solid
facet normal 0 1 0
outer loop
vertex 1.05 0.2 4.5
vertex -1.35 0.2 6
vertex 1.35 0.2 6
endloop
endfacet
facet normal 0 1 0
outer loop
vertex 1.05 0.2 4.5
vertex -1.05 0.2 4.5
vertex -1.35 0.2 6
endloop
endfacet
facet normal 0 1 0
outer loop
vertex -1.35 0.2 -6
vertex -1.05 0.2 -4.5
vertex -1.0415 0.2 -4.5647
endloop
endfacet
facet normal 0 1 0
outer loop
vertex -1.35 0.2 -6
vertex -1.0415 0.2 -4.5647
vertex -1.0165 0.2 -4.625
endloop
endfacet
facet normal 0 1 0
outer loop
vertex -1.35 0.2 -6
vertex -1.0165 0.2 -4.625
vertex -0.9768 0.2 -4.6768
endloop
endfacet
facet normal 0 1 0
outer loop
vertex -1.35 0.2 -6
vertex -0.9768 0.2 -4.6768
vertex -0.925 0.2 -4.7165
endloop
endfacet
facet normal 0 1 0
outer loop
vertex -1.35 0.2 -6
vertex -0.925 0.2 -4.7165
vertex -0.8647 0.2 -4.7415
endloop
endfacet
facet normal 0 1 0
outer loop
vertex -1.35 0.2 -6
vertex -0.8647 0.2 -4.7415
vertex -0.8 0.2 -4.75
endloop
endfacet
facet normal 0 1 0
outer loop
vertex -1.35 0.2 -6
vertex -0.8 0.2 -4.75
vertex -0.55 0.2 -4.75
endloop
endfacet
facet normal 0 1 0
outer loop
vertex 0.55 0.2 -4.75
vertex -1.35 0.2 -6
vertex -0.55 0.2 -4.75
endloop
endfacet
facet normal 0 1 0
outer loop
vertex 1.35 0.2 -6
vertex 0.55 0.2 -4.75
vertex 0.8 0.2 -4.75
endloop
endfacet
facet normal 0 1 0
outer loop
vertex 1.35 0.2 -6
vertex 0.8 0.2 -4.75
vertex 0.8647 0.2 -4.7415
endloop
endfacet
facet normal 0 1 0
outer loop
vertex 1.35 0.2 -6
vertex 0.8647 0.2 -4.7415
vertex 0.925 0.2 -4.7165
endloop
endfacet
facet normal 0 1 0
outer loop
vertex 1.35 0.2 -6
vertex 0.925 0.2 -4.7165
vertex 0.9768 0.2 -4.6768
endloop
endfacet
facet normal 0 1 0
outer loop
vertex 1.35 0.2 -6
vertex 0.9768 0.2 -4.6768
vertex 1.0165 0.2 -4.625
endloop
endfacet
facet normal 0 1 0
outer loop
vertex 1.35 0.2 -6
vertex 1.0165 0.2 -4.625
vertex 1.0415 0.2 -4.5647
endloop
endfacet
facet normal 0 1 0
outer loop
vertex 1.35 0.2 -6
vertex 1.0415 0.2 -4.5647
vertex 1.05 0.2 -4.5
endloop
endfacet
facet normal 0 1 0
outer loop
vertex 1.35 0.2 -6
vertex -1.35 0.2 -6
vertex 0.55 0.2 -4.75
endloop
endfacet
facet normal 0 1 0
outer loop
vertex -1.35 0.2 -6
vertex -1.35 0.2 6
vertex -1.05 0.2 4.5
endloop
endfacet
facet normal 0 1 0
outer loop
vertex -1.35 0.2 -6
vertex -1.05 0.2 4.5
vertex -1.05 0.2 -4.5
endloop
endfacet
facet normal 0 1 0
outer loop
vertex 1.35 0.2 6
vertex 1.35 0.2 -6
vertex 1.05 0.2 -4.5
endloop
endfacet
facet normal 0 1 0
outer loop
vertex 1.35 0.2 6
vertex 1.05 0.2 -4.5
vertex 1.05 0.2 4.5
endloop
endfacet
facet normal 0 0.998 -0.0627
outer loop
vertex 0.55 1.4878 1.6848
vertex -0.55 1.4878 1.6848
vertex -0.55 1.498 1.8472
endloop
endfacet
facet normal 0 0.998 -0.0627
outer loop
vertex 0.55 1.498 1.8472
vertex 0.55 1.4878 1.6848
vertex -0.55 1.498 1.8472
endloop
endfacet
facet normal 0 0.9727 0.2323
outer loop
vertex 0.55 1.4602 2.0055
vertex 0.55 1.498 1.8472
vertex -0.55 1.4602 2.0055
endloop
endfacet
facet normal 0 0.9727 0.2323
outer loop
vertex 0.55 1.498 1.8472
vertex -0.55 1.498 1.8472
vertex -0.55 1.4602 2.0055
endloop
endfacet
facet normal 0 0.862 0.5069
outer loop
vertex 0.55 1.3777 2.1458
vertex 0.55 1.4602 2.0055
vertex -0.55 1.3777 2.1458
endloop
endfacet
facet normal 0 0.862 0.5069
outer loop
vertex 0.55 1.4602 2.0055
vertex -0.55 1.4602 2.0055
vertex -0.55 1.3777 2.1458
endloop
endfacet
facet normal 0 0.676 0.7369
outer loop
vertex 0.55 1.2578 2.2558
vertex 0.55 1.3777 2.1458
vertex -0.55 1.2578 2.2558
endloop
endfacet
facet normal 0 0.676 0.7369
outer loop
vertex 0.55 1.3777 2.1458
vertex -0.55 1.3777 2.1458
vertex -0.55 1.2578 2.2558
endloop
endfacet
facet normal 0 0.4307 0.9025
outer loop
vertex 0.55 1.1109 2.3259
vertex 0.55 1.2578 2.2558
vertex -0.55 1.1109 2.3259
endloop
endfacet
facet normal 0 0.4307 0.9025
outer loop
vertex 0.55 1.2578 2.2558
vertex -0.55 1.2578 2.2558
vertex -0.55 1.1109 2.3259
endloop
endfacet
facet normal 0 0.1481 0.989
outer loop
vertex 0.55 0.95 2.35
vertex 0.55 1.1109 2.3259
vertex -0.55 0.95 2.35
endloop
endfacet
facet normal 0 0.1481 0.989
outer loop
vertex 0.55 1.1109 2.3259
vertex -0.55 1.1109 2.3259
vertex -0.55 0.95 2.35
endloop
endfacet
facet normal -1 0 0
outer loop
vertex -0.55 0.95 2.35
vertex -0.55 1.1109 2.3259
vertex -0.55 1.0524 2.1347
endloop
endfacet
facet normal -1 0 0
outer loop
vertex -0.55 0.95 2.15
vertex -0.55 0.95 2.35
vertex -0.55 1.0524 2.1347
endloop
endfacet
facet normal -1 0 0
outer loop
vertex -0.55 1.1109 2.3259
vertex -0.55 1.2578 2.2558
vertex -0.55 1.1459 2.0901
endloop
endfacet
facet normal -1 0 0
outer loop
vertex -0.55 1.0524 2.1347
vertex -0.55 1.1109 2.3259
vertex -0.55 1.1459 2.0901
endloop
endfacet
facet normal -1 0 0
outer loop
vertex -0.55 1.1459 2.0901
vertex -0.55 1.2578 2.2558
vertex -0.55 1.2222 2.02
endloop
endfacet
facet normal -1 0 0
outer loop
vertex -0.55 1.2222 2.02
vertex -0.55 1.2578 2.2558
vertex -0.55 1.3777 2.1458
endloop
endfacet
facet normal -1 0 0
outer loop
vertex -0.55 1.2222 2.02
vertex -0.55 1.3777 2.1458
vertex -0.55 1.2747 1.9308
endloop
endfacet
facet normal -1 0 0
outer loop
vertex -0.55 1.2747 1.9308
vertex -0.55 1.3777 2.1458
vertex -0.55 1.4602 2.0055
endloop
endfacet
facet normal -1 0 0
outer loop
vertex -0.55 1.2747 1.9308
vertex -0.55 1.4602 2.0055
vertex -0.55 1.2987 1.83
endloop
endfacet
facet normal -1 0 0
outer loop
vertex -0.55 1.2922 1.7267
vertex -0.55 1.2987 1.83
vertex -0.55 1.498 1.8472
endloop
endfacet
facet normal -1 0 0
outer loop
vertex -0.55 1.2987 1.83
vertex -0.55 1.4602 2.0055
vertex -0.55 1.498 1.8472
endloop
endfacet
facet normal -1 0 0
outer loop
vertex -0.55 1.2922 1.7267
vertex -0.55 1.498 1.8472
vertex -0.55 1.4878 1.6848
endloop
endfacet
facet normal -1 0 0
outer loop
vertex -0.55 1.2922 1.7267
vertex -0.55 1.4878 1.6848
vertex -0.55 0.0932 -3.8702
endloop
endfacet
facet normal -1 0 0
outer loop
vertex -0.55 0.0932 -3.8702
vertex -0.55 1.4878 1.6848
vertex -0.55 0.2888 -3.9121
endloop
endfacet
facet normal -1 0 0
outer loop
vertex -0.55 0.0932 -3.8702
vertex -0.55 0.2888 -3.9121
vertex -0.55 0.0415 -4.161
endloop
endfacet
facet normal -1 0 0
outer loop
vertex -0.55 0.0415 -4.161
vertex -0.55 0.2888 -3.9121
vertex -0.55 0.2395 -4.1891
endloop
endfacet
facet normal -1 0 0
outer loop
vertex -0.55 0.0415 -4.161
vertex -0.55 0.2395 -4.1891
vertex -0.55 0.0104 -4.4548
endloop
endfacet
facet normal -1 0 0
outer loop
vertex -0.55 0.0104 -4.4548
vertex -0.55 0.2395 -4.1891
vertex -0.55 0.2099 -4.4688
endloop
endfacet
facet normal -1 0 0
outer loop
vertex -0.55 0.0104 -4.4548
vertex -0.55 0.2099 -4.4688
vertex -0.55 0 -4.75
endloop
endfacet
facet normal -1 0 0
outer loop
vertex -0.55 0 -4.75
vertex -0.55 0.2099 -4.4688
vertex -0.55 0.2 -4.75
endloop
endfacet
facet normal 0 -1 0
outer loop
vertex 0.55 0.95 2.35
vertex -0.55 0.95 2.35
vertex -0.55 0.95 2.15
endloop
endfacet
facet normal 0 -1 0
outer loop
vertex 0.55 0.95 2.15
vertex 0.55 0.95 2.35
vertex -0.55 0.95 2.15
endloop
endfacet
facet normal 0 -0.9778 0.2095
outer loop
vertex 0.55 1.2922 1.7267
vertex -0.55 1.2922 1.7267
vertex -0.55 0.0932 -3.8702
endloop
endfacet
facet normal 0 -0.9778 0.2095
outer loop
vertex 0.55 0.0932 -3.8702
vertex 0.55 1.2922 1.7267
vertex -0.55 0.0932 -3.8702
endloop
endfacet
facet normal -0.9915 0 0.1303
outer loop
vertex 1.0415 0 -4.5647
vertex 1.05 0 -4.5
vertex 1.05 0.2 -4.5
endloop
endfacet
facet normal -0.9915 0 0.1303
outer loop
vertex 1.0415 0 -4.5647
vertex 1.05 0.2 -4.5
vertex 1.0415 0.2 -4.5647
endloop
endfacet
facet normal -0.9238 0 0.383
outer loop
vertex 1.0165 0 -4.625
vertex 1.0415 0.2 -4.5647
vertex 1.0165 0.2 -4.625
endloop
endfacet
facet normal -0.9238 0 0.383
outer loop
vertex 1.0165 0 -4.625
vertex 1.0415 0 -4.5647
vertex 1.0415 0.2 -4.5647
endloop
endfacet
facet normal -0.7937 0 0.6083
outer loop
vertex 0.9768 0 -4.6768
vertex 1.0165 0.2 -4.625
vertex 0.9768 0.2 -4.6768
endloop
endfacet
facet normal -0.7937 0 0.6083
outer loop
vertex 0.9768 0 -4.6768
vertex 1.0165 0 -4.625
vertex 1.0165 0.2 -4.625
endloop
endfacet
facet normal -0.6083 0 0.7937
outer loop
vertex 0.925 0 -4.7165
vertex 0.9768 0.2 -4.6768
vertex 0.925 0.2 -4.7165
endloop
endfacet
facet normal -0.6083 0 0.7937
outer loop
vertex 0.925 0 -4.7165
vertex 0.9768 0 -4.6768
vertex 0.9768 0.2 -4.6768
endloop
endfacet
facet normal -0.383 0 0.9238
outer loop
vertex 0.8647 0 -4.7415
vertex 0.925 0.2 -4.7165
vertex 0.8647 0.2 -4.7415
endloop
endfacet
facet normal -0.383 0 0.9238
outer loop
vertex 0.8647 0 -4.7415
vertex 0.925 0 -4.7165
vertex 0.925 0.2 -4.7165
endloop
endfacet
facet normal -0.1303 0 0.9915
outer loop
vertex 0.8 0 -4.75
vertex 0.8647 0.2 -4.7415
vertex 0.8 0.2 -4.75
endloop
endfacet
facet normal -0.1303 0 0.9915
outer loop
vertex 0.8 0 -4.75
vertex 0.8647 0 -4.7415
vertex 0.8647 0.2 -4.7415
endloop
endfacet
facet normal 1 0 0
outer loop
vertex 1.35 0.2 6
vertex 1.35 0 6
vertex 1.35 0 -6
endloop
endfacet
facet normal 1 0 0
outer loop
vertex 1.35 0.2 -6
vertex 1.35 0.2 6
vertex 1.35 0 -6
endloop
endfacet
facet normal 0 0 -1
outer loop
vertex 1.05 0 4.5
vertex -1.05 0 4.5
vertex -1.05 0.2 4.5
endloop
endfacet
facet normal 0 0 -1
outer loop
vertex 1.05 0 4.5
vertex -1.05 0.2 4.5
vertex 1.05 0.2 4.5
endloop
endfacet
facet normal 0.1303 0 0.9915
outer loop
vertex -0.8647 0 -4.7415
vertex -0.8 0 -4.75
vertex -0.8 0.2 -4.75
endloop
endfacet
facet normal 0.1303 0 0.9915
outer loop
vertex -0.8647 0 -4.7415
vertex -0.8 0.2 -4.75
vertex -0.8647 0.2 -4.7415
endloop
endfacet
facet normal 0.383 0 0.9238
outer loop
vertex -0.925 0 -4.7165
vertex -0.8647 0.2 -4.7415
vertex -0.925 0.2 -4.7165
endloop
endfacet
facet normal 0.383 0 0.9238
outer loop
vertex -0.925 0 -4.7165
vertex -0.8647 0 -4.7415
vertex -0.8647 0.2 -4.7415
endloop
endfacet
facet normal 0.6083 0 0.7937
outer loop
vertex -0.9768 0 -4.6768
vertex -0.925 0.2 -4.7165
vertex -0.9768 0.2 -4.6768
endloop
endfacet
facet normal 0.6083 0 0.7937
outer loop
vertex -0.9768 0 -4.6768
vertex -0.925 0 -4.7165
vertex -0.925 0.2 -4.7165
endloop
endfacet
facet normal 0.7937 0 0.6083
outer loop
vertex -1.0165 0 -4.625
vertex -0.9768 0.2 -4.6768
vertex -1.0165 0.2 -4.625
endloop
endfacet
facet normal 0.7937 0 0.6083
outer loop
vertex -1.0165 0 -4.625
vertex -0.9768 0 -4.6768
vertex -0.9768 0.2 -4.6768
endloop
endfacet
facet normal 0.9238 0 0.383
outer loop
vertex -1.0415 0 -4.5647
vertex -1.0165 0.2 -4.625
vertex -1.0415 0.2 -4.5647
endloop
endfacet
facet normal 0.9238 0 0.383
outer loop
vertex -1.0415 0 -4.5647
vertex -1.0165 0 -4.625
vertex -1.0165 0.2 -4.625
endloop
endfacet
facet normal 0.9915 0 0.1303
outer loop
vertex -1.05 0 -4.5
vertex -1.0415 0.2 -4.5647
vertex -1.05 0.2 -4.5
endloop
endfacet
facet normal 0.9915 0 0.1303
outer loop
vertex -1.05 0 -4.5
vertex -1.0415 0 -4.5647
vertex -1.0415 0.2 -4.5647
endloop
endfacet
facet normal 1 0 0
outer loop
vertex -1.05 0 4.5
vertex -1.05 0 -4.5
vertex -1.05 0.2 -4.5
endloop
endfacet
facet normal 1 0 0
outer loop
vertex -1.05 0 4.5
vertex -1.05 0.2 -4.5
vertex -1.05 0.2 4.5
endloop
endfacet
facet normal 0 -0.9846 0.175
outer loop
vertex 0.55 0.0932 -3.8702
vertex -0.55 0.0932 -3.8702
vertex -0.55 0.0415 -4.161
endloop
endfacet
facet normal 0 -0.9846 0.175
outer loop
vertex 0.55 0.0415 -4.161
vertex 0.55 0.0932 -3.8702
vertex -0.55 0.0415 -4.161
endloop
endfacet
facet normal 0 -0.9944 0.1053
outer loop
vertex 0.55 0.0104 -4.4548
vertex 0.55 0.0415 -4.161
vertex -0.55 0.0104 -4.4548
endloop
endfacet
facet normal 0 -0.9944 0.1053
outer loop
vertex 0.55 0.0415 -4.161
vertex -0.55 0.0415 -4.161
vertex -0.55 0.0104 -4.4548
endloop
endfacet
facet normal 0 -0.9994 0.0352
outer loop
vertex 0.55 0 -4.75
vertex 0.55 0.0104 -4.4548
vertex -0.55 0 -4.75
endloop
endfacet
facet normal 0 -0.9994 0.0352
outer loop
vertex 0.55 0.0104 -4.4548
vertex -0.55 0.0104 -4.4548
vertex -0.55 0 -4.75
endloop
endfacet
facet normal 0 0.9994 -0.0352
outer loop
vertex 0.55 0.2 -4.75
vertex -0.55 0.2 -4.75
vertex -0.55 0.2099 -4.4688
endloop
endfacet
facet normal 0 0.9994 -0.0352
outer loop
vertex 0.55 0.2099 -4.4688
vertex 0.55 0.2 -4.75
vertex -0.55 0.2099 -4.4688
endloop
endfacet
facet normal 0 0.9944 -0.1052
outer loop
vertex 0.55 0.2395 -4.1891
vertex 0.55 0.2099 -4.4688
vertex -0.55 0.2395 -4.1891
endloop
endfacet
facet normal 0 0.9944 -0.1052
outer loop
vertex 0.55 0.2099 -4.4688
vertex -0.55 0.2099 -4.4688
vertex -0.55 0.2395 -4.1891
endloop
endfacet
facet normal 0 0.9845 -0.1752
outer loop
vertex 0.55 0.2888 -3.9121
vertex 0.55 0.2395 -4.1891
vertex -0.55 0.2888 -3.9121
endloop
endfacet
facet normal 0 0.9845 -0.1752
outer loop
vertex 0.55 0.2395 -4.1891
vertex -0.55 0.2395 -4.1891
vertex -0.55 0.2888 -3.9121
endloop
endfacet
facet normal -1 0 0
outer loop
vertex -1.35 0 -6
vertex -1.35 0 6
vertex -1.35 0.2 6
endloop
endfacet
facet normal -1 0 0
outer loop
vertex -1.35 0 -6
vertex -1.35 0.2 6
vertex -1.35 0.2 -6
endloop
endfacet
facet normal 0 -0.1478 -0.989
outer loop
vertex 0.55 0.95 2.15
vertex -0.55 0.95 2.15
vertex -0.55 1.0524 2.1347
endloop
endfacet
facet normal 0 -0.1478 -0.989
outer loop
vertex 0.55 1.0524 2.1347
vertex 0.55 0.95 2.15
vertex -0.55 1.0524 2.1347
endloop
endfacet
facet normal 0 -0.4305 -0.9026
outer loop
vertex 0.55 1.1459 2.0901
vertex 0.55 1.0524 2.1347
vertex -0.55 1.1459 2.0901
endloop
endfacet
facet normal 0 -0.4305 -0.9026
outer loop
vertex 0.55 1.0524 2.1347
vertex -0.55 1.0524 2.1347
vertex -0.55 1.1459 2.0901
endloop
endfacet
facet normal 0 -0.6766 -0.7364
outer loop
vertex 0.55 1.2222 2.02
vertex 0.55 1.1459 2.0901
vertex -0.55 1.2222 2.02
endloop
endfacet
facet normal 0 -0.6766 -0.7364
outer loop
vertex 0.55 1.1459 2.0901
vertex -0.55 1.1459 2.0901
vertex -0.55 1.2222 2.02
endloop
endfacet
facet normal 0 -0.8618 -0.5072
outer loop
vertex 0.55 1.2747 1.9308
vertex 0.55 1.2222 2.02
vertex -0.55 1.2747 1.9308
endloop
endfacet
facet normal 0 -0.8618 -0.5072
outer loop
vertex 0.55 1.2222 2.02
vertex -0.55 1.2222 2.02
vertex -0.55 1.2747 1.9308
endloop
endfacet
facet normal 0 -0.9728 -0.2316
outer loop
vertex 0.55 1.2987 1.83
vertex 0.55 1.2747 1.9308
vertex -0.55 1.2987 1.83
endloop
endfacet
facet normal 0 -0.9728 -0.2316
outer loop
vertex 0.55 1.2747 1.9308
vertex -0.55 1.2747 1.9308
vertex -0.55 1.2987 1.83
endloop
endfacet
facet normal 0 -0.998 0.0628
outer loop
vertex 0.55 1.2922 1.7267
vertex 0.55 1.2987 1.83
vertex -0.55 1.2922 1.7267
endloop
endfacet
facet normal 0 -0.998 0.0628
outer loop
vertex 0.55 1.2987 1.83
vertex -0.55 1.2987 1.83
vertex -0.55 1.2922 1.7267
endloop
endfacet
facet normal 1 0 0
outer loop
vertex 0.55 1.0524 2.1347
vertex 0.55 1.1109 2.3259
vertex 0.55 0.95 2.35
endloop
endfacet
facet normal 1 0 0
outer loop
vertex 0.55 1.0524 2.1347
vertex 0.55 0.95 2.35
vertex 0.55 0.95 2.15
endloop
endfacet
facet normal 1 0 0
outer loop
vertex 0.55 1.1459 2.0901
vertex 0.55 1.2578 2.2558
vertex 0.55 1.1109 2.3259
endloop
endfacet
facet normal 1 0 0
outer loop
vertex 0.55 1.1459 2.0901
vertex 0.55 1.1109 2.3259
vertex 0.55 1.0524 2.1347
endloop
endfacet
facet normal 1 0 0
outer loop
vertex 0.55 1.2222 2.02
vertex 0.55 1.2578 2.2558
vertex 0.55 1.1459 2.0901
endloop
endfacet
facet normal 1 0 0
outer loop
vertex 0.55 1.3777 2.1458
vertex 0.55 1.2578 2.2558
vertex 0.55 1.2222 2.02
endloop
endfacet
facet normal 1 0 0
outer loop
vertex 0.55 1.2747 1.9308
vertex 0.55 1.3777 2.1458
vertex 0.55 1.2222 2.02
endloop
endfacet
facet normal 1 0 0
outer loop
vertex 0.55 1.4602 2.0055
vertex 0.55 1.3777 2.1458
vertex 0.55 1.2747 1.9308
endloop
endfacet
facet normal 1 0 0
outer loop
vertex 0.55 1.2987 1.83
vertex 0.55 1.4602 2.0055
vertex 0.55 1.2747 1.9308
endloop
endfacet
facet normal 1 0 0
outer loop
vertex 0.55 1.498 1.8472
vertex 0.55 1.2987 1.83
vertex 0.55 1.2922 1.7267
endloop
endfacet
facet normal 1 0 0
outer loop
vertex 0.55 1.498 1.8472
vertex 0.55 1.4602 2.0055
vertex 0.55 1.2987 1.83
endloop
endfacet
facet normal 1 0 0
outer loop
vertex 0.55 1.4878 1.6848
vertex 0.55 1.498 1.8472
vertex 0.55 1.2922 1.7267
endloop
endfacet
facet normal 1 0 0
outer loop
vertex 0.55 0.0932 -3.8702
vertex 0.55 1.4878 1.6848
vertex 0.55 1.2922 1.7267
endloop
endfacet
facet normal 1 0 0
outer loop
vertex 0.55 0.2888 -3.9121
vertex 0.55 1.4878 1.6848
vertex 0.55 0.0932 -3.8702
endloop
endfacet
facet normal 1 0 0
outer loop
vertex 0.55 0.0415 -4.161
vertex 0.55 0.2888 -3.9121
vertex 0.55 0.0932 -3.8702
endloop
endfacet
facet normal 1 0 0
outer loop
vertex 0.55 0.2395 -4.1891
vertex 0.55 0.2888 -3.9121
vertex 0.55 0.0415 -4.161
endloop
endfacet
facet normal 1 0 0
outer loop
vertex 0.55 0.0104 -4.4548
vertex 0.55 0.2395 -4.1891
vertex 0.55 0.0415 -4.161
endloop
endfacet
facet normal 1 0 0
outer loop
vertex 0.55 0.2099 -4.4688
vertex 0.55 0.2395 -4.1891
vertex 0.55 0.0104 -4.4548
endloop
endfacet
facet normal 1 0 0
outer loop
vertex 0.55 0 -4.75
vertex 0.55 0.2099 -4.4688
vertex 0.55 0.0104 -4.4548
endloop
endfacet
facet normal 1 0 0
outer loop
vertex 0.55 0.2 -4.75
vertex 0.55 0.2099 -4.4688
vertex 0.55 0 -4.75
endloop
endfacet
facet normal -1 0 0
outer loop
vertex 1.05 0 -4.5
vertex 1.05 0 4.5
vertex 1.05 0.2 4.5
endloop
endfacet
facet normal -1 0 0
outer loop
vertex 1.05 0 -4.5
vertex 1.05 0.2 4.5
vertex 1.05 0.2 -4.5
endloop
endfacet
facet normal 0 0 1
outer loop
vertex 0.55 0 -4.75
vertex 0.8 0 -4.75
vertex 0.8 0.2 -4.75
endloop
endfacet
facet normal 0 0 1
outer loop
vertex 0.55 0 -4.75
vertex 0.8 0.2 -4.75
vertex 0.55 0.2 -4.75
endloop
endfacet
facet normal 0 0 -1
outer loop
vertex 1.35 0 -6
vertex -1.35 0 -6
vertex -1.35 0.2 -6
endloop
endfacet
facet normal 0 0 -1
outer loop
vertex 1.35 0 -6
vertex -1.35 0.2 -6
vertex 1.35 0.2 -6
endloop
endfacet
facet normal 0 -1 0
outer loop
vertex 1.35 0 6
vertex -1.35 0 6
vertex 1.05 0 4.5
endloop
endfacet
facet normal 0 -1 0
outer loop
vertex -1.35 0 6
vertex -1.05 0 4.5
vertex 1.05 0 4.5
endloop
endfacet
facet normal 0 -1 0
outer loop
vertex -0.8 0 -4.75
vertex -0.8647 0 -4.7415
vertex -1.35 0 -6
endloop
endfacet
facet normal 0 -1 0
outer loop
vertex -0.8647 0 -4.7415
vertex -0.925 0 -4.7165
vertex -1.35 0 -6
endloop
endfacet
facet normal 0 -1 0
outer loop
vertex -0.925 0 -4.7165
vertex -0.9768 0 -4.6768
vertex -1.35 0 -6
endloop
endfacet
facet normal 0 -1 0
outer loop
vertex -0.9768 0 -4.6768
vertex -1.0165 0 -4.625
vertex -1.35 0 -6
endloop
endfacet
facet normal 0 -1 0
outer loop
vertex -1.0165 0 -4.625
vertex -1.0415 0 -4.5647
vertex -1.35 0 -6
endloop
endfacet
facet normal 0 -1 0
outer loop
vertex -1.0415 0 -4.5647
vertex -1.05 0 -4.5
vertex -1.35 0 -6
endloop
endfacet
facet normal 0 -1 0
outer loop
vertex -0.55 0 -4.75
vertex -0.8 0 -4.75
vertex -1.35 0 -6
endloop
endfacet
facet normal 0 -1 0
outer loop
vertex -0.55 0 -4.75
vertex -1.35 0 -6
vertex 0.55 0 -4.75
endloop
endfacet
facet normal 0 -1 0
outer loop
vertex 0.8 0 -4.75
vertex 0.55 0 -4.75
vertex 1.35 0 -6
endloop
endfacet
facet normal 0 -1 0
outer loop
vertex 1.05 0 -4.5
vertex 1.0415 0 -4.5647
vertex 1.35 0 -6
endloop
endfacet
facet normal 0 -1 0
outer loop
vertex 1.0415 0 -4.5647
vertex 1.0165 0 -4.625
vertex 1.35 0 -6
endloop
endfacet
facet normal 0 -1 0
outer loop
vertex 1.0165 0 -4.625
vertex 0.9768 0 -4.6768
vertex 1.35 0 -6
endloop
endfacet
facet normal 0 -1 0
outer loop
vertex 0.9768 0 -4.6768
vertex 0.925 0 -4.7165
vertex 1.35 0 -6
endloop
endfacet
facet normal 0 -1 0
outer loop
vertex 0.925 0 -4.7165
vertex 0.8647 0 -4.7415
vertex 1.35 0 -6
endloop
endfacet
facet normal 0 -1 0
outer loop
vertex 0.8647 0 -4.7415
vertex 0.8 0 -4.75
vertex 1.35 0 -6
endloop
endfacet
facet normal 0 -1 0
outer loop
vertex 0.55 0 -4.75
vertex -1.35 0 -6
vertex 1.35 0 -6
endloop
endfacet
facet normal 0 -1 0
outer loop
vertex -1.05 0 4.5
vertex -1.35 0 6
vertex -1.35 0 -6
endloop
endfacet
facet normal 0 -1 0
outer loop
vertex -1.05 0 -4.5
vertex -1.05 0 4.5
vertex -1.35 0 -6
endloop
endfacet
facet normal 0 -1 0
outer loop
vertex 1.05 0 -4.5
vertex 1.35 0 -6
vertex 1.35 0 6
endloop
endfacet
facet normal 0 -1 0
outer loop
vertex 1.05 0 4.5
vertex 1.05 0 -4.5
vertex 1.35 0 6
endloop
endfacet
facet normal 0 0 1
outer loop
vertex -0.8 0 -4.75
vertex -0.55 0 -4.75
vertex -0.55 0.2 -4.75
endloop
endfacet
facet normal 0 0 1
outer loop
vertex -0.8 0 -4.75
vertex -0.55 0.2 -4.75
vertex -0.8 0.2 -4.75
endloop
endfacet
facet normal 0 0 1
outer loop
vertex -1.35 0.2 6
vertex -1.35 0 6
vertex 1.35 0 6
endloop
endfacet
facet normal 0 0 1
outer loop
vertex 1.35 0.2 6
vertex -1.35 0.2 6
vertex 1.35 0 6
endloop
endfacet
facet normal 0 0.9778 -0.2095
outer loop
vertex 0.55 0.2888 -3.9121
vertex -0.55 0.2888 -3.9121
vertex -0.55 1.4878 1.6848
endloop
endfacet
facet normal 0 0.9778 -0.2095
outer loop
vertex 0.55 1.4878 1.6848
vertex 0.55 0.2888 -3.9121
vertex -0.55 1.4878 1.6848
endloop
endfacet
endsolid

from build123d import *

# Parameters (mm, degrees)
SKETCH1_W           = 2.7
SKETCH1_H           = 12
BOSS_EXTRUDE1_DEPTH = 0.2
CUT_EXTRUDE1_DEPTH  = 1.2
BOSS_EXTRUDE2_START = -0.55
BOSS_EXTRUDE2_DEPTH = 1.1


with BuildPart() as part:
    # Sketch1 → Boss-Extrude1 (new body)
    with BuildSketch(Plane(origin=(0, 0, 0), x_dir=(1, 0, 0), z_dir=(0, 1, 0))):
        Rectangle(SKETCH1_W, SKETCH1_H)
    extrude(amount=BOSS_EXTRUDE1_DEPTH)

    # Sketch2 → Cut-Extrude1 (cut, through all)
    with BuildSketch(Plane(origin=(0, 0, 0), x_dir=(1, 0, 0), z_dir=(0, 1, 0))):
        with BuildLine():
            Line((-1.05, 4.5), (-1.05, -4.5))
            Line((-1.05, -4.5), (1.05, -4.5))
            Line((1.05, -4.5), (1.05, 4.5))
            ThreePointArc((1.05, 4.5), (0.976776695, 4.676776695), (0.8, 4.75))
            Line((0.8, 4.75), (-0.8, 4.75))
            ThreePointArc((-0.8, 4.75), (-0.976776695, 4.676776695), (-1.05, 4.5))
        make_face()
    extrude(amount=CUT_EXTRUDE1_DEPTH, mode=Mode.SUBTRACT)

    # Sketch3 → Boss-Extrude2 (add)
    with BuildSketch(Plane(origin=(0, 0, 0), x_dir=(0, 0, -1), z_dir=(1, 0, 0)).offset(BOSS_EXTRUDE2_START)):
        with BuildLine():
            Line((4.75, 0), (4.75, 0.2))
            ThreePointArc((4.75, 0.2), (4.328691756, 0.222249459), (3.912070453, 0.288750318))
            Line((3.912070453, 0.288750318), (-1.684784687, 1.487796831))
            ThreePointArc((-1.684784687, 1.487796831), (-2.145782864, 1.377708091), (-2.35, 0.95))
            Line((-2.35, 0.95), (-2.15, 0.95))
            ThreePointArc((-2.15, 0.95), (-2.020043641, 1.222177876), (-1.726681165, 1.292234347))
            Line((-1.726681165, 1.292234347), (3.870173975, 0.093187834))
            ThreePointArc((3.870173975, 0.093187834), (4.307626344, 0.023361932), (4.75, 0))
        make_face()
    extrude(amount=BOSS_EXTRUDE2_DEPTH)


solid = part.part
